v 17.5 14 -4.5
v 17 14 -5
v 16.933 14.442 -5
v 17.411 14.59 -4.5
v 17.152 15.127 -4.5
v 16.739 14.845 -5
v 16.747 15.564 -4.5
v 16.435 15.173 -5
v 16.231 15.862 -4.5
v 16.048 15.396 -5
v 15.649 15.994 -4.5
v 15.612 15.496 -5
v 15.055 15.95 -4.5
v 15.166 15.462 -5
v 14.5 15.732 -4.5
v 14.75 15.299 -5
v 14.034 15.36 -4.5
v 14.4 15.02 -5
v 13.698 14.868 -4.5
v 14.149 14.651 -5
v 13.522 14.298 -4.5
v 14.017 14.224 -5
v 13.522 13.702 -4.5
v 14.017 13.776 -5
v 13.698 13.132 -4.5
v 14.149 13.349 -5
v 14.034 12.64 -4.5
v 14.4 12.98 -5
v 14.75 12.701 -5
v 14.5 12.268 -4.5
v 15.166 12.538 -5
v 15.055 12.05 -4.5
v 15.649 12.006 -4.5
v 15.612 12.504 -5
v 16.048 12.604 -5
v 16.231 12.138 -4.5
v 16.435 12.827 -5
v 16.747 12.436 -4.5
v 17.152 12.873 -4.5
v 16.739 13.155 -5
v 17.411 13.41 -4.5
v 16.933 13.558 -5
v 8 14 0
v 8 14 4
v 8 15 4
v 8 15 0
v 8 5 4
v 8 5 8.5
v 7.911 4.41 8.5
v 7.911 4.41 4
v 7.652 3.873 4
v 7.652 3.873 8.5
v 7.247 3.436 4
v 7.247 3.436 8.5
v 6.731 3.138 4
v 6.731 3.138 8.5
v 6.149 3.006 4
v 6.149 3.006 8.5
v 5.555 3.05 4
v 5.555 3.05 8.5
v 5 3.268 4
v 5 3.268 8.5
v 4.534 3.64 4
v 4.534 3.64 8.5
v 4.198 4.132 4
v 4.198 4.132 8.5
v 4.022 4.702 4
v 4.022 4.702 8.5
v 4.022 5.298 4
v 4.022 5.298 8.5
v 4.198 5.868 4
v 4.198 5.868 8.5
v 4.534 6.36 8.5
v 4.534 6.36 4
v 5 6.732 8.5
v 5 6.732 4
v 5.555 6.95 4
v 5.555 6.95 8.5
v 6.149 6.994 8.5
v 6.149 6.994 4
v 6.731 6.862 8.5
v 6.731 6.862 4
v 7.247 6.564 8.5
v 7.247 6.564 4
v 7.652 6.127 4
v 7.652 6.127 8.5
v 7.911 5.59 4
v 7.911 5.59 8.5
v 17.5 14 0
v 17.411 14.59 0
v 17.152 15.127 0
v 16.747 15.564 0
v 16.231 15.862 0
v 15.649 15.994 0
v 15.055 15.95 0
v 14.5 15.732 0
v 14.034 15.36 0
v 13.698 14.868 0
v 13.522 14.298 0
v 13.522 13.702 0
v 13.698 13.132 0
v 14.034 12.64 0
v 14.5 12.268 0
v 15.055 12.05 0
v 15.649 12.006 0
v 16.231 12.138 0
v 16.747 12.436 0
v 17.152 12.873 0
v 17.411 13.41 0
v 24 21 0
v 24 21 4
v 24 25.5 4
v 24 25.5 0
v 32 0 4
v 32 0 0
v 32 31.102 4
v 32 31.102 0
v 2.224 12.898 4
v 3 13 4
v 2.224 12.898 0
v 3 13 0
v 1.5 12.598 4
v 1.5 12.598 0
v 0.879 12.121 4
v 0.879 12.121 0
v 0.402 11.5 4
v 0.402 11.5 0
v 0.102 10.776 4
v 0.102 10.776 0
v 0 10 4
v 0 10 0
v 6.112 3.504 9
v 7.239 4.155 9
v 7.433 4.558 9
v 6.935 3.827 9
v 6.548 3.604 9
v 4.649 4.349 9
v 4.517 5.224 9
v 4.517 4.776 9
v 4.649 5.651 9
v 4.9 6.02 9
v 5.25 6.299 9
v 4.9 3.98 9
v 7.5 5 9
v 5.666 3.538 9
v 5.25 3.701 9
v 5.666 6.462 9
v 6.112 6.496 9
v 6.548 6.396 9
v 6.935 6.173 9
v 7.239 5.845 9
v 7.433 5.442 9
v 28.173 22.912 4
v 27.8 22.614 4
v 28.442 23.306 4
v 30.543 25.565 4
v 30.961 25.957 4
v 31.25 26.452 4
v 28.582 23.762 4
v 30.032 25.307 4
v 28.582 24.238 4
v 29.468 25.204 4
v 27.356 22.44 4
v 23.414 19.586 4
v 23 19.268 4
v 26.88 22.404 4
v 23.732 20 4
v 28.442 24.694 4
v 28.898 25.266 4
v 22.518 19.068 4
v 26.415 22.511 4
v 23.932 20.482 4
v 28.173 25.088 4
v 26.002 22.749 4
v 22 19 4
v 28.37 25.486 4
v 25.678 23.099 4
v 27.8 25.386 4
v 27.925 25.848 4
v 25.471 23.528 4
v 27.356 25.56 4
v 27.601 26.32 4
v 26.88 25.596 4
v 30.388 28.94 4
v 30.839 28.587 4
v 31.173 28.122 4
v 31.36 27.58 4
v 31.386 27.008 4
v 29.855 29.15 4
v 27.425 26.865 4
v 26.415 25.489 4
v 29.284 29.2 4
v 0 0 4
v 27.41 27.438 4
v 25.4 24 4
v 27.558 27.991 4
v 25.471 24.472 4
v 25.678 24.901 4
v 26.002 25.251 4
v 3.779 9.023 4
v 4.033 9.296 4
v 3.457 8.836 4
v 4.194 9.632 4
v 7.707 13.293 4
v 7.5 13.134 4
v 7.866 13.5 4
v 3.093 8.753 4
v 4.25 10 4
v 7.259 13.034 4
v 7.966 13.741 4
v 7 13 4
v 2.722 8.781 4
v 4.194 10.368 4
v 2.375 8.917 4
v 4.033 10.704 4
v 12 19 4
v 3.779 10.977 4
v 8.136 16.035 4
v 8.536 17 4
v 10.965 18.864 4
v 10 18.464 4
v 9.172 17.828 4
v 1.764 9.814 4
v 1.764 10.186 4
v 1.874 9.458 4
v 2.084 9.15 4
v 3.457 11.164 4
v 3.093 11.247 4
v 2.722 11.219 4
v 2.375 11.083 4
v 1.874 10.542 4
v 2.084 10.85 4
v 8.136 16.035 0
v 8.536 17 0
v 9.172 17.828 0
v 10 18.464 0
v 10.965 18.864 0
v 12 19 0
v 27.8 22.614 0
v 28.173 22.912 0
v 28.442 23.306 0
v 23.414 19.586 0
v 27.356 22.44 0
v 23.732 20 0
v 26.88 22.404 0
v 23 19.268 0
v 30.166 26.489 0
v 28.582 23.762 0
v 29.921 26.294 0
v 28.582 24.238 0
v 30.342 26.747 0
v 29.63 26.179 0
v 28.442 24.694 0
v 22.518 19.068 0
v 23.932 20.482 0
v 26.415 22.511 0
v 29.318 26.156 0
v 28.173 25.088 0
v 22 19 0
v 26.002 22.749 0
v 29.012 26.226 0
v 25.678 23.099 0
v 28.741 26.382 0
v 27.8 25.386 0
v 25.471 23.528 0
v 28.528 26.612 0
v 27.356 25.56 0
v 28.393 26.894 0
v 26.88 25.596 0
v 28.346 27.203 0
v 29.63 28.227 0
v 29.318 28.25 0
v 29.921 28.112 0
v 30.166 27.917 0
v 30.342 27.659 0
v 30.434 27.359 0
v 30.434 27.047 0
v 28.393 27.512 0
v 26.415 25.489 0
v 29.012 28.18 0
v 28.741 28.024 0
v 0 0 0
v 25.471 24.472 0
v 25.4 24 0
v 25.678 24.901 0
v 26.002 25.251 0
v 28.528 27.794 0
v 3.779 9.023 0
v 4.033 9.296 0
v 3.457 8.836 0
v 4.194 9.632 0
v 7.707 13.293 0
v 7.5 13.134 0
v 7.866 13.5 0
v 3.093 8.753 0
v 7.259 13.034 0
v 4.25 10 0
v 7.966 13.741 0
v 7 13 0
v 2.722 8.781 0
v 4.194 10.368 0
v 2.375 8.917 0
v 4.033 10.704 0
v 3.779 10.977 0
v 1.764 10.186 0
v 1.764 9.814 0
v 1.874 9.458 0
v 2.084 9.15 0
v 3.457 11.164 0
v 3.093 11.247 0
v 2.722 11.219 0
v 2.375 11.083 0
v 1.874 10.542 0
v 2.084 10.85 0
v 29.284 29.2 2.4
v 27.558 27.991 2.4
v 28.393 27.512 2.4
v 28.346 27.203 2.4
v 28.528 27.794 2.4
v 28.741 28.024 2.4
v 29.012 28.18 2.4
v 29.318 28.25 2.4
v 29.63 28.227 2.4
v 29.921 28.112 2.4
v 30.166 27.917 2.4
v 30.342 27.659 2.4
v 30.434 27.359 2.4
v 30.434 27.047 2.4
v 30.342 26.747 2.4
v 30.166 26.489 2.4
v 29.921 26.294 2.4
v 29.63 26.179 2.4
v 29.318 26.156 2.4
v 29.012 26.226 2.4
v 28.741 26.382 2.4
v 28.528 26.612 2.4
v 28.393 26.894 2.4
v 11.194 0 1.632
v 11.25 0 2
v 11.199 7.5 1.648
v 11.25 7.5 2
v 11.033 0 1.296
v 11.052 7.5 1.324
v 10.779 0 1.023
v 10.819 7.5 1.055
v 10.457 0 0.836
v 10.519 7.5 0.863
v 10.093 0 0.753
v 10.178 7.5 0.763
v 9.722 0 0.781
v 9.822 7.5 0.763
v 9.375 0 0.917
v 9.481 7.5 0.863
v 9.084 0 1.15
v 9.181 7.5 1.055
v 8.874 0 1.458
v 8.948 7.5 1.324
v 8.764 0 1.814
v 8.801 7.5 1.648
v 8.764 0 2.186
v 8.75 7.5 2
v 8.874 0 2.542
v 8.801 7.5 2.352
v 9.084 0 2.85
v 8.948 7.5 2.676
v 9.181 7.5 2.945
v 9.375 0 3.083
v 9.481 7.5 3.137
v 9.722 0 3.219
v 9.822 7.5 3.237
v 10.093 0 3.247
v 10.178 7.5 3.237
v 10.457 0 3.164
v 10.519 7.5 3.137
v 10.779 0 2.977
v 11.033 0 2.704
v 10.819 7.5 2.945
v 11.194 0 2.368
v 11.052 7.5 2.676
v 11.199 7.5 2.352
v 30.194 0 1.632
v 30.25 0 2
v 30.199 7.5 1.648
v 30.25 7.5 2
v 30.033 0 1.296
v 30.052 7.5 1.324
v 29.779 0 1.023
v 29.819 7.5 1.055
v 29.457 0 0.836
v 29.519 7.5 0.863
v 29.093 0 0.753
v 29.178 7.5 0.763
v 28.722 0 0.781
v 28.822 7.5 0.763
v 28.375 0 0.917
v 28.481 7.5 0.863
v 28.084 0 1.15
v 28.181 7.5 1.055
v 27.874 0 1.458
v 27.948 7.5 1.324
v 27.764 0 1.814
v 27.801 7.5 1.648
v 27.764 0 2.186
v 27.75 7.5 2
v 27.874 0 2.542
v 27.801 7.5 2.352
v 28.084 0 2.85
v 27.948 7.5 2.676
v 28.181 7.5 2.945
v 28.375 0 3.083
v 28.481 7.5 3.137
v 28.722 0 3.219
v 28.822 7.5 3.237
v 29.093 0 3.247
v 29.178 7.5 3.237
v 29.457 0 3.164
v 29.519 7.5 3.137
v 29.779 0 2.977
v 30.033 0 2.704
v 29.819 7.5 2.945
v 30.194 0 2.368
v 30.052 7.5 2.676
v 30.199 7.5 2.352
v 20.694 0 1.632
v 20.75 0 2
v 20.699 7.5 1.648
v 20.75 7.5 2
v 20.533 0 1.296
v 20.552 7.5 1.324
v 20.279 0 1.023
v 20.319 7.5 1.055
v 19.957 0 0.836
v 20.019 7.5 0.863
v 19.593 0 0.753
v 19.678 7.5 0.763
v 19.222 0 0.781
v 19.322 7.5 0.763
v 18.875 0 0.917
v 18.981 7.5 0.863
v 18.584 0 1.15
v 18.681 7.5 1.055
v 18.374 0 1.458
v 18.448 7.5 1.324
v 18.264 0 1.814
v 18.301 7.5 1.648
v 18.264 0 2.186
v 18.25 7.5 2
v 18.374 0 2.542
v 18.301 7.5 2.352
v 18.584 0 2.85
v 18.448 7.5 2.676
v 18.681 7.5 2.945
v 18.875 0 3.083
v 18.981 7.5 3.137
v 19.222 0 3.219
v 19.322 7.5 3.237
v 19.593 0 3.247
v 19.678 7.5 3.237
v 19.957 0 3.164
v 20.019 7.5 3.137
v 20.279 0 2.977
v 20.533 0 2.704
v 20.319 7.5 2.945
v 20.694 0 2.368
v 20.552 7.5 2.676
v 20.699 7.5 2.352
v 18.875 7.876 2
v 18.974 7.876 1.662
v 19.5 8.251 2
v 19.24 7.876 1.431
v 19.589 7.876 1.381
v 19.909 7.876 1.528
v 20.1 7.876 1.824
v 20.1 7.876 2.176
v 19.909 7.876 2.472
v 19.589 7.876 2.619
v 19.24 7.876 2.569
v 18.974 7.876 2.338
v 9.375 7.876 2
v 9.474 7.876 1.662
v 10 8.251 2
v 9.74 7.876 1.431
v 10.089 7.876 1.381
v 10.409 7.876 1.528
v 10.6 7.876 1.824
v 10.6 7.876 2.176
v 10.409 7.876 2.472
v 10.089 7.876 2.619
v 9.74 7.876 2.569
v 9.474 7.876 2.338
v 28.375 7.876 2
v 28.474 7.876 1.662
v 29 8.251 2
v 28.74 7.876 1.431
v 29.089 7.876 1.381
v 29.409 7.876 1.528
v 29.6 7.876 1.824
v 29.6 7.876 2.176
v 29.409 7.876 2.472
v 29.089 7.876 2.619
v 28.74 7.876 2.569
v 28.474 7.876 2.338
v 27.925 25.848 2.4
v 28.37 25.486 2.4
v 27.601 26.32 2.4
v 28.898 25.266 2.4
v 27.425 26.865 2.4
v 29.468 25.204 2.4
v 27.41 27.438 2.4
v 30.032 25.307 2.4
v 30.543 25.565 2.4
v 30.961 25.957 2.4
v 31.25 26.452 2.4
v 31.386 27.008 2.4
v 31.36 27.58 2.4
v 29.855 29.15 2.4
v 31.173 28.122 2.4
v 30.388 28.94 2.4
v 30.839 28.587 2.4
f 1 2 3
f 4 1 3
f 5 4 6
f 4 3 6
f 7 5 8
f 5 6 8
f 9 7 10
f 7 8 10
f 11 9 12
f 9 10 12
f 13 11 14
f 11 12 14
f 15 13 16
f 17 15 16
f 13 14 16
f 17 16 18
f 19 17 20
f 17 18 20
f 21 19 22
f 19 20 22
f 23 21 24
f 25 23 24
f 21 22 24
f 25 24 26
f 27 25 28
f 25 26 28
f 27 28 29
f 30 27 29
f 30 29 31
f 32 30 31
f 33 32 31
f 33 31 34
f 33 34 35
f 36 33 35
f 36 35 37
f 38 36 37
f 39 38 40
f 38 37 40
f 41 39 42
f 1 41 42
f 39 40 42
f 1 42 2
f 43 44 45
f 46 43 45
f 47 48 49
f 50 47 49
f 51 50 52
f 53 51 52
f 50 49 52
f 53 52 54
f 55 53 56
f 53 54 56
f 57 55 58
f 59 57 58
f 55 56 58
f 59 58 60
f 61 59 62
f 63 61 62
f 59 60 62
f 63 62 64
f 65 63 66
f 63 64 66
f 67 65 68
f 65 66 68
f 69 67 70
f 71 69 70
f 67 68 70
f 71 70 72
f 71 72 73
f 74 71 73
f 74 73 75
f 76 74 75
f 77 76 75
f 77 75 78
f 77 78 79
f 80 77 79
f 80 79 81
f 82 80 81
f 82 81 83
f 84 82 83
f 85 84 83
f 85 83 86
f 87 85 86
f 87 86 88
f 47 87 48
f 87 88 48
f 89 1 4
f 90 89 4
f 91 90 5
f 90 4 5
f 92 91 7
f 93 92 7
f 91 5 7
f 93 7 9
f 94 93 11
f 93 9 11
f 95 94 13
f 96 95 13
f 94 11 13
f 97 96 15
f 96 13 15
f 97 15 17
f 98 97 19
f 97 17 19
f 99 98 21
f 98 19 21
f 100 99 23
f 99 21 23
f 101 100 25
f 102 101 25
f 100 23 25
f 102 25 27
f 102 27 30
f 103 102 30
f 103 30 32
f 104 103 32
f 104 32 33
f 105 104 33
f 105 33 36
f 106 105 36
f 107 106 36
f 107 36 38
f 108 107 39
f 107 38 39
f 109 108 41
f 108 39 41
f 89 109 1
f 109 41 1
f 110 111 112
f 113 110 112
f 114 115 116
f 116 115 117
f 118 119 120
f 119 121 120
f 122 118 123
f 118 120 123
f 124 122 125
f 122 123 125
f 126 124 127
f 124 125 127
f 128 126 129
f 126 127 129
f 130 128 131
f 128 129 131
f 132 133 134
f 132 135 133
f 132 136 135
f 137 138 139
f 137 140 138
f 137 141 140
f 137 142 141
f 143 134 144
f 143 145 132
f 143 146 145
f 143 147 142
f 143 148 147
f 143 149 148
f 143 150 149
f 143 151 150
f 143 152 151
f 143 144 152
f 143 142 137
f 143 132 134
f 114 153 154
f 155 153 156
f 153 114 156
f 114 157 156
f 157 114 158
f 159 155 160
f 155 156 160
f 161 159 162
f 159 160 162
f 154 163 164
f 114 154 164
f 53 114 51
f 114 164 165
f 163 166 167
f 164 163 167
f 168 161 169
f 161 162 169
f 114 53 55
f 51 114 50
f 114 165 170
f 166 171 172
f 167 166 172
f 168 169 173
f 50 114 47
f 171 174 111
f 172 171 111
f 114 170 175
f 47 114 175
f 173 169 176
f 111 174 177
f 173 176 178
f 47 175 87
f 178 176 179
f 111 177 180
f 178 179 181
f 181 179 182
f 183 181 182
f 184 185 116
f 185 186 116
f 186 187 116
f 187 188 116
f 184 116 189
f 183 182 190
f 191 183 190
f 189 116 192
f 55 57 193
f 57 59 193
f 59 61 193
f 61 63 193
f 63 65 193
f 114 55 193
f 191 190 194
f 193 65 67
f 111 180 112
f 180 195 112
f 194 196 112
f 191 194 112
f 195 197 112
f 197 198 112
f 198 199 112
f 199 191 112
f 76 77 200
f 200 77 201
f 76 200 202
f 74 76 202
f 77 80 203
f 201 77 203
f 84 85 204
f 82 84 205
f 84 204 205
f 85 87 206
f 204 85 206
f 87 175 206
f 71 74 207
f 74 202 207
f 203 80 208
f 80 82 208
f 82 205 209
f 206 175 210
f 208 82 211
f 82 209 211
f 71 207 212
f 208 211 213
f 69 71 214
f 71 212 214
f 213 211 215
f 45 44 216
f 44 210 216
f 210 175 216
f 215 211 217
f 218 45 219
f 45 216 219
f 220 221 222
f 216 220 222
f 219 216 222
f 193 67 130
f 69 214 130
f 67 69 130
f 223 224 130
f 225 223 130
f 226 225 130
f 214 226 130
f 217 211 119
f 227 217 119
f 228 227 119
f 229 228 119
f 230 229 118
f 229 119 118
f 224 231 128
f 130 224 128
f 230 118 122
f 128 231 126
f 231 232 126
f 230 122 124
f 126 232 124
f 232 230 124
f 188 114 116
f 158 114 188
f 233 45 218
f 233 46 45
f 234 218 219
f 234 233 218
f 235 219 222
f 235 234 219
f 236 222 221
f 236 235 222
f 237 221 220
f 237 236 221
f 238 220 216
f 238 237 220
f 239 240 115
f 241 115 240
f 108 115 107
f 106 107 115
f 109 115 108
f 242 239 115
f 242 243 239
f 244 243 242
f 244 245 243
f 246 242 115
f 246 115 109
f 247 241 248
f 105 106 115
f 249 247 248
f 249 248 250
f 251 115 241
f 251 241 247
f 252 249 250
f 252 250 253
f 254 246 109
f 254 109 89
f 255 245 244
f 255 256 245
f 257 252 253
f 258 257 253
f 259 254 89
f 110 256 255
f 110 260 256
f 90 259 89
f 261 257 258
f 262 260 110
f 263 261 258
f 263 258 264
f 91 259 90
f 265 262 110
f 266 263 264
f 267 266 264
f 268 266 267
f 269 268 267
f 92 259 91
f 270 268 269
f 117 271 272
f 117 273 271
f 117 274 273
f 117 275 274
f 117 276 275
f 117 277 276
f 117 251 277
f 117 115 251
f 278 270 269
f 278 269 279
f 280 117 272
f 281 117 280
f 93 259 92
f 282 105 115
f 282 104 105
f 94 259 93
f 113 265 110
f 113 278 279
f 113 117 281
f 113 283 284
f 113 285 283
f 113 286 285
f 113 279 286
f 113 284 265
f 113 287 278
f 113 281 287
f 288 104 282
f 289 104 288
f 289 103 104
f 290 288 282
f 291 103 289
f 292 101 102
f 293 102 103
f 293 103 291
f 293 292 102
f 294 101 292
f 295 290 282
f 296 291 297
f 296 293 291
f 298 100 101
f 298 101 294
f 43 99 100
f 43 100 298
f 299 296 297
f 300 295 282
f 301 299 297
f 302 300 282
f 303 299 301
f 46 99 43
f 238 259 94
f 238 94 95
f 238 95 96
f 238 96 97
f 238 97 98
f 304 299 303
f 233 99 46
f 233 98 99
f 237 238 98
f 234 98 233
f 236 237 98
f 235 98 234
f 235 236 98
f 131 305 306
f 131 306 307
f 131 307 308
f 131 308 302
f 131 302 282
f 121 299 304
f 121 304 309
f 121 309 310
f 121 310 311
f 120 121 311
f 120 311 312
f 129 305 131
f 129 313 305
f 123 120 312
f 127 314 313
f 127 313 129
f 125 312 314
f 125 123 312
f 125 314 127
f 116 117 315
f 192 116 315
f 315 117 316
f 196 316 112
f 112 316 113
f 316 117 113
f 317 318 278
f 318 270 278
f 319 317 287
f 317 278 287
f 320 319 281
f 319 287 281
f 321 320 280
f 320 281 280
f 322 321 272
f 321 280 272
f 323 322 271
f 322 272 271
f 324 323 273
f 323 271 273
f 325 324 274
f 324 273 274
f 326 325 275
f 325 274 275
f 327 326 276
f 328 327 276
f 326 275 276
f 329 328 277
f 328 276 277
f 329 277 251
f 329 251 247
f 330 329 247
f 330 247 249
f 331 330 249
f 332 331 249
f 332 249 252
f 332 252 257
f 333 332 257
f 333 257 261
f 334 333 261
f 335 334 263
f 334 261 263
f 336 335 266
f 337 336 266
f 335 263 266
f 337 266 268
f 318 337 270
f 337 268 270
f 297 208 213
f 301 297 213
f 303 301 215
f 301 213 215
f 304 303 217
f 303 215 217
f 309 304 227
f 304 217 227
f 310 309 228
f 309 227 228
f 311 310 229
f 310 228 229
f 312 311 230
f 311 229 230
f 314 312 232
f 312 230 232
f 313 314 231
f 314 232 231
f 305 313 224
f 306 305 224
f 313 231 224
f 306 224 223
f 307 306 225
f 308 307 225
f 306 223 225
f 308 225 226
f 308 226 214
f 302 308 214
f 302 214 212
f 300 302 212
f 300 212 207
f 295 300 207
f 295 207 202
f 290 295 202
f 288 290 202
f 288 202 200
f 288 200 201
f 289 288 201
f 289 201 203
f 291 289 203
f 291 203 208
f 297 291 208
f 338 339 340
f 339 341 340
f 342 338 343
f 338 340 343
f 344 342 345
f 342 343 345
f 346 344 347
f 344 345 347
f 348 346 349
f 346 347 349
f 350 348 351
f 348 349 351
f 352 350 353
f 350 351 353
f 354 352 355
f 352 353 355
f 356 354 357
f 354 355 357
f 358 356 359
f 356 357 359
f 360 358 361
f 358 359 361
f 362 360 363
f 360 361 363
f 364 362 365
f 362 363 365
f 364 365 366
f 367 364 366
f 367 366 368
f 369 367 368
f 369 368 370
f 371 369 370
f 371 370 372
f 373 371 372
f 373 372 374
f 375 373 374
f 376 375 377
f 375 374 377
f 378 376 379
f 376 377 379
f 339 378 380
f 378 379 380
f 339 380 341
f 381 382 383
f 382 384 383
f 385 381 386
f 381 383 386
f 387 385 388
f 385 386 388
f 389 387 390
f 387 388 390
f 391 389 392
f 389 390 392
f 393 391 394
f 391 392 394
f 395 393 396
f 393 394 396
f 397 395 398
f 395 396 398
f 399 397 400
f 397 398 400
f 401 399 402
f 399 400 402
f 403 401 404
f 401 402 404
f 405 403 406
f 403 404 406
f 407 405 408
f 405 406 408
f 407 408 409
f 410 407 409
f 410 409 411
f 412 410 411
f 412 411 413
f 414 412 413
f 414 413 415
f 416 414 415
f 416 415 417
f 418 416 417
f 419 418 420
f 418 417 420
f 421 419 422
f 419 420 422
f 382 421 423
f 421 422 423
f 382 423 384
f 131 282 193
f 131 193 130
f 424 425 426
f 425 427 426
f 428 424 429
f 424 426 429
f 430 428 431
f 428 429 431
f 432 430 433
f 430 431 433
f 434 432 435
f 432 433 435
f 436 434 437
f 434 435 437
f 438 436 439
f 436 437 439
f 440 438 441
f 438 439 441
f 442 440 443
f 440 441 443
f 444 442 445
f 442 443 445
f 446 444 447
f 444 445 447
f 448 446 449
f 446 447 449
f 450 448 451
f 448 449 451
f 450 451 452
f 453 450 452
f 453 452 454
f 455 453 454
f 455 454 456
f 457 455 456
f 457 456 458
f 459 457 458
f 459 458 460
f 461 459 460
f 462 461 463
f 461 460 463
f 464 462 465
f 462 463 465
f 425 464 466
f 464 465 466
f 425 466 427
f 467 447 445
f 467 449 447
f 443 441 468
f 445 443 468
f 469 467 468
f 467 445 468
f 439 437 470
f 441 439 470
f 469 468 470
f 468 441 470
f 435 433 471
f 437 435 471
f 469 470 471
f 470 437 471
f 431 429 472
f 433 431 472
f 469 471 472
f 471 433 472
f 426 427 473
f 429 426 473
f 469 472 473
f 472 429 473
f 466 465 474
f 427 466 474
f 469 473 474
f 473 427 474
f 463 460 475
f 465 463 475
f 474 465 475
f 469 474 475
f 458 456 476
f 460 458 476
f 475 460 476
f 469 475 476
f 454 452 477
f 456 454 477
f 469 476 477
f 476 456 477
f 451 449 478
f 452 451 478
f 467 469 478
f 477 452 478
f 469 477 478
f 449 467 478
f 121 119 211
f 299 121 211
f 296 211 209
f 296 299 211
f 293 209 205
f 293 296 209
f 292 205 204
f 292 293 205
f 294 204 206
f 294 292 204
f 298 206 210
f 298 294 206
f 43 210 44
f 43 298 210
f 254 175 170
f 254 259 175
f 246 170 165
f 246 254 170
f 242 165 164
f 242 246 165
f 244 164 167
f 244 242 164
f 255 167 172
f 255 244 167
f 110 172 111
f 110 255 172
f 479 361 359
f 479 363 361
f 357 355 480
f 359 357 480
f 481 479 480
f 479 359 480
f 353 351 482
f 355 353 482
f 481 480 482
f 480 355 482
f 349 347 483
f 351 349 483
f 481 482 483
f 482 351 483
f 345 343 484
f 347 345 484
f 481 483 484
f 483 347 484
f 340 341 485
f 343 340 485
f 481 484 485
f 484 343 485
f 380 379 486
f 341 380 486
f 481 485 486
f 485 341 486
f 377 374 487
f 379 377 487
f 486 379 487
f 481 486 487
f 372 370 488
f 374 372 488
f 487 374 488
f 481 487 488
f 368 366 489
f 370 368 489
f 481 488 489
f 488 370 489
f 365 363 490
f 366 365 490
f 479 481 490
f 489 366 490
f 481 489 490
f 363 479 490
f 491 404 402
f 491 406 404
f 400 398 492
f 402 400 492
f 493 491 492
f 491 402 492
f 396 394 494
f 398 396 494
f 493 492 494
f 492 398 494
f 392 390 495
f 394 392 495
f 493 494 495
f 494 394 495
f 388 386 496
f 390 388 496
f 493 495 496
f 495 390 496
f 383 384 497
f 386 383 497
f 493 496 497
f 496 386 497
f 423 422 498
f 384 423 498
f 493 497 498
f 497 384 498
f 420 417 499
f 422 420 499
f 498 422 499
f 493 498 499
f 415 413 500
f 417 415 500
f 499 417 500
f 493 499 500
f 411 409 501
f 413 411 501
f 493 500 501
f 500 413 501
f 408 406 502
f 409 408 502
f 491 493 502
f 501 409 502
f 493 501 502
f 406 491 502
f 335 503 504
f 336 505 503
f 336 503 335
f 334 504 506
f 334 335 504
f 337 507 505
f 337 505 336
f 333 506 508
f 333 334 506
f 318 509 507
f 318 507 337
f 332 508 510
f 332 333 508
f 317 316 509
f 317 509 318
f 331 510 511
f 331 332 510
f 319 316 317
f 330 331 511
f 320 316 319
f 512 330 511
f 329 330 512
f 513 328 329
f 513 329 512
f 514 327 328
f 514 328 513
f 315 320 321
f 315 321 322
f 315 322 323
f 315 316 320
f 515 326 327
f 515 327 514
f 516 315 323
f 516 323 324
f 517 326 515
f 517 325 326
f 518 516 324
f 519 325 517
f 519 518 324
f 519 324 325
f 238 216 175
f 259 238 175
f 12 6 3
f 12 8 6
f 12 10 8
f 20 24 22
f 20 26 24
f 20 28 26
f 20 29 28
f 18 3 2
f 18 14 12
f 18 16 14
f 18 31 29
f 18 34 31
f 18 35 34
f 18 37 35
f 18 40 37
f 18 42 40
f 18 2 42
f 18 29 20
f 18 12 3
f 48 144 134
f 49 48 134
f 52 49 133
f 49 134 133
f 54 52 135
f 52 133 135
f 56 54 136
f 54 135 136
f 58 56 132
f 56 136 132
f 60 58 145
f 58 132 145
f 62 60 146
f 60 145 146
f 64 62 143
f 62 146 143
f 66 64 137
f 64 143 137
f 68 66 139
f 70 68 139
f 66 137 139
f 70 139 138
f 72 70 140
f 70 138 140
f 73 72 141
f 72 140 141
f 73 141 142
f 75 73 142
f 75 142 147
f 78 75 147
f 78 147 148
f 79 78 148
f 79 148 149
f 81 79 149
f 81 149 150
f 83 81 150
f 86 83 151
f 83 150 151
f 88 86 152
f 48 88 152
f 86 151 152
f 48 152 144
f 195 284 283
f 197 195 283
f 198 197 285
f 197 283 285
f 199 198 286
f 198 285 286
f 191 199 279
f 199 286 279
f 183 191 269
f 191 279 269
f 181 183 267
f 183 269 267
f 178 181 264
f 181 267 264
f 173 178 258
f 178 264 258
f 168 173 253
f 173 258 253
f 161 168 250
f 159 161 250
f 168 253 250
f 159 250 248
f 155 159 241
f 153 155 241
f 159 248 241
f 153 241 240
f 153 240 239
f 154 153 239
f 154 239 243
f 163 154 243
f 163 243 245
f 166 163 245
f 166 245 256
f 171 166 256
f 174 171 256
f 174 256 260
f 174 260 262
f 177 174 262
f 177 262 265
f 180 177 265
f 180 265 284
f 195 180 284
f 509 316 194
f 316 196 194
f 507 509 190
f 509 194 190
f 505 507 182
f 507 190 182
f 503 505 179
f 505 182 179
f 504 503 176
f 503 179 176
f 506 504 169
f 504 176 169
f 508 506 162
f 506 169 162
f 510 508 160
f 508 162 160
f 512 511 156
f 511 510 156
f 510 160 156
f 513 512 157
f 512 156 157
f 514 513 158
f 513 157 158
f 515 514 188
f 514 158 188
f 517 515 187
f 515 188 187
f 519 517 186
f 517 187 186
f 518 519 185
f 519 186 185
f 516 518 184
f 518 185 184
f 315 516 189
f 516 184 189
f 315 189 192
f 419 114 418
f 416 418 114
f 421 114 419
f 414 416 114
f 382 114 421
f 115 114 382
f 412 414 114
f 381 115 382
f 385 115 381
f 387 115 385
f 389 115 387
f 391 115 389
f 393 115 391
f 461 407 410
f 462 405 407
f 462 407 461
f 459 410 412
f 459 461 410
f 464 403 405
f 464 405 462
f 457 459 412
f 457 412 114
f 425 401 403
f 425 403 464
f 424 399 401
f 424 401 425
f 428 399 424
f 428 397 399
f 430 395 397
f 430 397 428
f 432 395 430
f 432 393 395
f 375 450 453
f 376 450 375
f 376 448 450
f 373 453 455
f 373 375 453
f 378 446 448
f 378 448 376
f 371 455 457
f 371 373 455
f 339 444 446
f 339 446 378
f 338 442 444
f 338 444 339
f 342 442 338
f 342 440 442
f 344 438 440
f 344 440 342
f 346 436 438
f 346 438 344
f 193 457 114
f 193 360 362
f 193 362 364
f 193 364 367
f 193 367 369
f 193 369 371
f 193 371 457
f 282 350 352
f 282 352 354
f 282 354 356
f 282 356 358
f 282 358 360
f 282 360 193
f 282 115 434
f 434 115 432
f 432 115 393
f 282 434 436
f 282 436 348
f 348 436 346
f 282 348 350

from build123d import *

# Parameters (mm, degrees)
SKETCH1_W                       = 32
SKETCH1_H                       = 31.101660306
BOSS_EXTRUDE1_DEPTH             = 4
SKETCH2_W                       = 8
SKETCH2_H                       = 18.101660306
CUT_EXTRUDE1_DEPTH              = 5
SKETCH3_W                       = 16
SKETCH3_H                       = 12.101660306
CUT_EXTRUDE2_DEPTH              = 5
DRAFT1_ANGLE                    = -35.000000002
SKETCH4_W                       = 2
SKETCH4_H                       = 5
SKETCH5_W                       = 2
SKETCH5_H                       = 5
F_3_2_3_2_DIAMETER_HOLE1_D      = 3.2
F_3_2_3_2_DIAMETER_HOLE1_DEPTH  = 9
F_2_5_2_5_DIAMETER_HOLE1_D      = 2.5
F_2_5_2_5_DIAMETER_HOLE1_DEPTH  = 9
M4X0_7_TAPPED_HOLE1_D           = 2.1
M4X0_7_TAPPED_HOLE1_DEPTH       = 9
M4X0_7_TAPPED_HOLE1_CBORE_D     = 4
M4X0_7_TAPPED_HOLE1_CBORE_DEPTH = 1.6
F_2_5_2_5_DIAMETER_HOLE2_D      = 2.5
F_2_5_2_5_DIAMETER_HOLE2_DEPTH  = 7.5
F_2_5_2_5_DIAMETER_HOLE2_TIP    = 0.751075774
CHAMFER1_SIZE                   = 0.5
FILLET1_R                       = 1
FILLET2_R                       = 2
FILLET3_R                       = 3
FILLET4_R                       = 4


with BuildPart() as part:
    # Sketch1 → Boss-Extrude1 (new body)
    with BuildSketch(Plane(origin=(0, 0, 0), x_dir=(-1, 0, 0), z_dir=(0, 0, -1))):
        with Locations((-16, 15.550830153)):
            Rectangle(SKETCH1_W, SKETCH1_H)
    extrude(amount=-BOSS_EXTRUDE1_DEPTH)

    # Sketch2 → Cut-Extrude1 (cut, through all)
    with BuildSketch(Plane.XY.offset(4)):
        with Locations((4, 22.050830153)):
            Rectangle(SKETCH2_W, SKETCH2_H)
    extrude(amount=-CUT_EXTRUDE1_DEPTH, mode=Mode.SUBTRACT)

    # Sketch3 → Cut-Extrude2 (cut, through all)
    with BuildSketch(Plane.XY.offset(4)):
        with Locations((16, 25.050830153)):
            Rectangle(SKETCH3_W, SKETCH3_H)
    extrude(amount=-CUT_EXTRUDE2_DEPTH, mode=Mode.SUBTRACT)

    # Draft1
    draft1_faces = [part.faces().sort_by_distance(p)[0] for p in [
        (28, 31.101660306, 2),
    ]]
    draft(draft1_faces, Plane(origin=(32, 31.101660306, 4), x_dir=(0, 0, 1), z_dir=(1, 0, 0)), DRAFT1_ANGLE)

    # Sketch4 → Revolve1 (revolve)
    with BuildSketch(Plane.XZ.offset(-5)):
        with Locations((7, 6.5)):
            Rectangle(SKETCH4_W, SKETCH4_H)
    revolve(axis=Axis((6, 5, 9), (0, 0, -1)))

    # Sketch5 → Revolve2 (revolve)
    with BuildSketch(Plane(origin=(0, 14, 0), x_dir=(1, 0, 0), z_dir=(0, 1, 0))):
        with Locations((16.5, 2.5)):
            Rectangle(SKETCH5_W, SKETCH5_H)
    revolve(axis=Axis((15.5, 14, -5), (0, 0, 1)))

    # Ø3.2 (3.2) Diameter Hole1
    with Locations(Plane.XY.offset(4)):
        with Locations((27, 24)):
            Hole(F_3_2_3_2_DIAMETER_HOLE1_D / 2, depth=F_3_2_3_2_DIAMETER_HOLE1_DEPTH)

    # Ø2.5 (2.5) Diameter Hole1
    with Locations(Plane(origin=(0, 0, 0), x_dir=(-1, 0, 0), z_dir=(0, 0, -1))):
        with Locations((-3, 10)):
            Hole(F_2_5_2_5_DIAMETER_HOLE1_D / 2, depth=F_2_5_2_5_DIAMETER_HOLE1_DEPTH)

    # M4x0.7 Tapped Hole1
    with Locations(Plane.XY.offset(4)):
        with Locations((29.395995182, 27.202999702)):
            CounterBoreHole(M4X0_7_TAPPED_HOLE1_D / 2, M4X0_7_TAPPED_HOLE1_CBORE_D / 2, M4X0_7_TAPPED_HOLE1_CBORE_DEPTH, depth=M4X0_7_TAPPED_HOLE1_DEPTH)

    # Ø2.5 (2.5) Diameter Hole2
    with Locations(Plane(origin=(0, 0, 0), x_dir=(-1, 0, 0), z_dir=(0, -1, 0))):
        with Locations((-10, -2), (-19.5, -2), (-29, -2)):
            Hole(F_2_5_2_5_DIAMETER_HOLE2_D / 2, depth=F_2_5_2_5_DIAMETER_HOLE2_DEPTH)
            with Locations((0, 0, -(F_2_5_2_5_DIAMETER_HOLE2_DEPTH + F_2_5_2_5_DIAMETER_HOLE2_TIP / 2))):  # 118° drill point
                Cone(0, F_2_5_2_5_DIAMETER_HOLE2_D / 2, F_2_5_2_5_DIAMETER_HOLE2_TIP, mode=Mode.SUBTRACT)

    # Chamfer1
    chamfer1_edges = [part.edges().sort_by_distance(p)[0] for p in [
        (4, 5, 9),
        (13.5, 14, -5),
    ]]
    chamfer(chamfer1_edges, length=CHAMFER1_SIZE)

    # Fillet1
    fillet1_edges = [part.edges().sort_by_distance(p)[0] for p in [
        (8, 13, 2),
    ]]
    fillet(fillet1_edges, radius=FILLET1_R)

    # Fillet2
    fillet2_edges = [part.edges().sort_by_distance(p)[0] for p in [
        (24, 19, 2),
    ]]
    fillet(fillet2_edges, radius=FILLET2_R)

    # Fillet3
    fillet3_edges = [part.edges().sort_by_distance(p)[0] for p in [
        (0, 13, 2),
    ]]
    fillet(fillet3_edges, radius=FILLET3_R)

    # Fillet4
    fillet4_edges = [part.edges().sort_by_distance(p)[0] for p in [
        (8, 19, 2),
    ]]
    fillet(fillet4_edges, radius=FILLET4_R)


solid = part.part
